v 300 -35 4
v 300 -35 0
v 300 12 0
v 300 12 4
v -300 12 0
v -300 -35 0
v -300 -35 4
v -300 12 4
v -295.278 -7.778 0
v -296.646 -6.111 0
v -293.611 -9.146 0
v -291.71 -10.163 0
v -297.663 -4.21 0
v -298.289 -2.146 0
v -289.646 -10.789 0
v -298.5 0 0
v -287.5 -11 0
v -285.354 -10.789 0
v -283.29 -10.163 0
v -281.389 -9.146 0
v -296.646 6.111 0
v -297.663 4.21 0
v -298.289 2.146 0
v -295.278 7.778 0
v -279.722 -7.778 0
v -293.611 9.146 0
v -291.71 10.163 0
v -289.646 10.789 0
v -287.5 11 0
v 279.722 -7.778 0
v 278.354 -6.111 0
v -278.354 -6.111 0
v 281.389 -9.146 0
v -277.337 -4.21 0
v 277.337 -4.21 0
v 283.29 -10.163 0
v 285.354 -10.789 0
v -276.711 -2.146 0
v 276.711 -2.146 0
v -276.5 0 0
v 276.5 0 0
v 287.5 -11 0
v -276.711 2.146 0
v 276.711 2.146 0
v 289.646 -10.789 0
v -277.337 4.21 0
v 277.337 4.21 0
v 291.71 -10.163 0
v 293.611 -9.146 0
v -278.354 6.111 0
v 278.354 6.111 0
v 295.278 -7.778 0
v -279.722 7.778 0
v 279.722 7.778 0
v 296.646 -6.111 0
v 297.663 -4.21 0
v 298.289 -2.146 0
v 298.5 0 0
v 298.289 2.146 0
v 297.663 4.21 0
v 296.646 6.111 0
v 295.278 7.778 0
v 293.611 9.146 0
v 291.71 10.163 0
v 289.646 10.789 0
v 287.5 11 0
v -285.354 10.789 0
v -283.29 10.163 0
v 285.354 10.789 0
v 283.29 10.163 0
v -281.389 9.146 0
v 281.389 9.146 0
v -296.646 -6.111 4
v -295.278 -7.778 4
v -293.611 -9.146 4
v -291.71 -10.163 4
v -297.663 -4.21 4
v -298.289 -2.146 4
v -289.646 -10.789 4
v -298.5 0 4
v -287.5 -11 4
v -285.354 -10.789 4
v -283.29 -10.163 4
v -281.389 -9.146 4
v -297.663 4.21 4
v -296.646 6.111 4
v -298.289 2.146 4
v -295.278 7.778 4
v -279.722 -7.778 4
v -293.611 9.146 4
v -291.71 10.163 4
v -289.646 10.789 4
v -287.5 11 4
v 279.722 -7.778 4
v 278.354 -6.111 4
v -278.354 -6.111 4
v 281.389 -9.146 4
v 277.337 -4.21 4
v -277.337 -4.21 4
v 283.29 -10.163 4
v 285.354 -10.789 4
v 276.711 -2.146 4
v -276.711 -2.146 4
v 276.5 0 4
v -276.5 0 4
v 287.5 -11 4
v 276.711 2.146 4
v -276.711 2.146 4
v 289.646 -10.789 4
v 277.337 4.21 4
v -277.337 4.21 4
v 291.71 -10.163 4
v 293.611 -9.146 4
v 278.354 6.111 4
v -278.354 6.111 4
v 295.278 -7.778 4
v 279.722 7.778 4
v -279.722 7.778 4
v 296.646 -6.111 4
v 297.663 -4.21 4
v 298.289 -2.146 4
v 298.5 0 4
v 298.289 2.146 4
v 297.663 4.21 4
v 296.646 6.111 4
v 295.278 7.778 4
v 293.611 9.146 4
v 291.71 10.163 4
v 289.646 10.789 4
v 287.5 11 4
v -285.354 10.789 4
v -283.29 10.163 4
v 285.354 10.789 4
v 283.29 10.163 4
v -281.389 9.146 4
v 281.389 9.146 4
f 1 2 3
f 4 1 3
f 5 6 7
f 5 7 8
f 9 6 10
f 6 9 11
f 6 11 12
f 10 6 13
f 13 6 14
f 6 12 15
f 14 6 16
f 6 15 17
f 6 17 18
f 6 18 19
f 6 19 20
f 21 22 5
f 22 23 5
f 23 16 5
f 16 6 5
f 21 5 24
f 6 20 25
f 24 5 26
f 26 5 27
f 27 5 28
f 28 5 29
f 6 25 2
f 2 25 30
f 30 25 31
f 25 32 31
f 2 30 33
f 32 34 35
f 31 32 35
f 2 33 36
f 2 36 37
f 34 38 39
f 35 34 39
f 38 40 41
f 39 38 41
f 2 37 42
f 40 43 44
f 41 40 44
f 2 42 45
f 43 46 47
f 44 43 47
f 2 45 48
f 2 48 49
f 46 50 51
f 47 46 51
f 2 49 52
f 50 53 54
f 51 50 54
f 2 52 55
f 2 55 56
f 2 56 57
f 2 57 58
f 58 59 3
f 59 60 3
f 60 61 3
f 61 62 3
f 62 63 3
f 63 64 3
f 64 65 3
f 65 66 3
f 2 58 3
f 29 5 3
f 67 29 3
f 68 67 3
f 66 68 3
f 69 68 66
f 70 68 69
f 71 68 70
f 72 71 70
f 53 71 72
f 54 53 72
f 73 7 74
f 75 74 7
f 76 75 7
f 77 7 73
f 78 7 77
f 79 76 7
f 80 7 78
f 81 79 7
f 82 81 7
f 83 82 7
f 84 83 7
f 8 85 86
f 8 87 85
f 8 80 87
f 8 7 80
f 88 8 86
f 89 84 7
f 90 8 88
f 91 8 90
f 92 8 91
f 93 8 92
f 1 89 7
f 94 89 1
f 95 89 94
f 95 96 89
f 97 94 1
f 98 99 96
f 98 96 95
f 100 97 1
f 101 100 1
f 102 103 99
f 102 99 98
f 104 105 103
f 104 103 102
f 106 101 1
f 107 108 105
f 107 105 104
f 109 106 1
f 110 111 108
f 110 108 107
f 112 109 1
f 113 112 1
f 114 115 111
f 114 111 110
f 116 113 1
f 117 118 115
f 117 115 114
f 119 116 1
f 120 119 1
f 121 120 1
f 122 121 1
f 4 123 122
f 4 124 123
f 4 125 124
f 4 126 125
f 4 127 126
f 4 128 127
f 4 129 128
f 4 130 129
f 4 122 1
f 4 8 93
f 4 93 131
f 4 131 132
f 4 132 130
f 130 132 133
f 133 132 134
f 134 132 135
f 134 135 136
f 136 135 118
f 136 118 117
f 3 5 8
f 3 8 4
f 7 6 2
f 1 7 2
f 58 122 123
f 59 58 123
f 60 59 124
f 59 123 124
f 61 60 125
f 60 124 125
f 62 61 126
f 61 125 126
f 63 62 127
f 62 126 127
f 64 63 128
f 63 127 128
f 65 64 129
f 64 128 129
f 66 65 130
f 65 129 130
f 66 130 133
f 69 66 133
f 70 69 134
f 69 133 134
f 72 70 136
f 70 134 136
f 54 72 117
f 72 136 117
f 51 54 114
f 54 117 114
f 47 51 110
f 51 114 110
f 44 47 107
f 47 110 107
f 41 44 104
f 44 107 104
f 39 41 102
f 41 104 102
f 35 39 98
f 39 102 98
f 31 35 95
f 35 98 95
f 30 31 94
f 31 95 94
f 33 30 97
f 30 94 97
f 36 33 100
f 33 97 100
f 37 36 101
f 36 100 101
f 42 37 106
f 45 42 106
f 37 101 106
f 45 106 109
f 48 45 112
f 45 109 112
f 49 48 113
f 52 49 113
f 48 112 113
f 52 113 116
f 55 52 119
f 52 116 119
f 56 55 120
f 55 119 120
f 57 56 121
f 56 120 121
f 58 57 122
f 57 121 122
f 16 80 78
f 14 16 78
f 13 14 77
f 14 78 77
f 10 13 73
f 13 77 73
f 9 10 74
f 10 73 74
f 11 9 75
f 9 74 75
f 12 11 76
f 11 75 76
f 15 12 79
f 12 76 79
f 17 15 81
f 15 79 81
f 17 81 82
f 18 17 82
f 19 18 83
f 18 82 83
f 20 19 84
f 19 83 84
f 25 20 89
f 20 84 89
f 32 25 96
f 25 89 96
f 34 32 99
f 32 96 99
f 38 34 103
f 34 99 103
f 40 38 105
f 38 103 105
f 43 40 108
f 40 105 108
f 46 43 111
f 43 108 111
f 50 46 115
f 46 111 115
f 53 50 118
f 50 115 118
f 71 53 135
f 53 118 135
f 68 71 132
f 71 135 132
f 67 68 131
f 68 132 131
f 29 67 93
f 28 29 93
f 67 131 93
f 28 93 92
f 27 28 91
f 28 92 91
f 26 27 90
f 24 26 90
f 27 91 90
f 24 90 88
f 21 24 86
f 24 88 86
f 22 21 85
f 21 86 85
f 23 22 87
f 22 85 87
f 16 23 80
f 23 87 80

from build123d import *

# Parameters (mm, degrees)
CROQUIS1_W              = 600
CROQUIS1_H              = 47
SALIENTE_EXTRUIR1_DEPTH = 4
CROQUIS2_R              = 11
CORTAR_EXTRUIR1_DEPTH   = 4


with BuildPart() as part:
    # Croquis1 → Saliente-Extruir1 (new body)
    with BuildSketch(Plane.XY):
        with Locations((0, -11.5)):
            Rectangle(CROQUIS1_W, CROQUIS1_H)
    extrude(amount=SALIENTE_EXTRUIR1_DEPTH)

    # Croquis2 → Cortar-Extruir1 (cut)
    with BuildSketch(Plane.XY.offset(4)):
        with Locations((287.5, 0)):
            Circle(CROQUIS2_R)
        with Locations(Location((-287.5, 0, 0), (0, 0, 180))):
            Circle(CROQUIS2_R)
    extrude(amount=-CORTAR_EXTRUIR1_DEPTH, mode=Mode.SUBTRACT)


solid = part.part
